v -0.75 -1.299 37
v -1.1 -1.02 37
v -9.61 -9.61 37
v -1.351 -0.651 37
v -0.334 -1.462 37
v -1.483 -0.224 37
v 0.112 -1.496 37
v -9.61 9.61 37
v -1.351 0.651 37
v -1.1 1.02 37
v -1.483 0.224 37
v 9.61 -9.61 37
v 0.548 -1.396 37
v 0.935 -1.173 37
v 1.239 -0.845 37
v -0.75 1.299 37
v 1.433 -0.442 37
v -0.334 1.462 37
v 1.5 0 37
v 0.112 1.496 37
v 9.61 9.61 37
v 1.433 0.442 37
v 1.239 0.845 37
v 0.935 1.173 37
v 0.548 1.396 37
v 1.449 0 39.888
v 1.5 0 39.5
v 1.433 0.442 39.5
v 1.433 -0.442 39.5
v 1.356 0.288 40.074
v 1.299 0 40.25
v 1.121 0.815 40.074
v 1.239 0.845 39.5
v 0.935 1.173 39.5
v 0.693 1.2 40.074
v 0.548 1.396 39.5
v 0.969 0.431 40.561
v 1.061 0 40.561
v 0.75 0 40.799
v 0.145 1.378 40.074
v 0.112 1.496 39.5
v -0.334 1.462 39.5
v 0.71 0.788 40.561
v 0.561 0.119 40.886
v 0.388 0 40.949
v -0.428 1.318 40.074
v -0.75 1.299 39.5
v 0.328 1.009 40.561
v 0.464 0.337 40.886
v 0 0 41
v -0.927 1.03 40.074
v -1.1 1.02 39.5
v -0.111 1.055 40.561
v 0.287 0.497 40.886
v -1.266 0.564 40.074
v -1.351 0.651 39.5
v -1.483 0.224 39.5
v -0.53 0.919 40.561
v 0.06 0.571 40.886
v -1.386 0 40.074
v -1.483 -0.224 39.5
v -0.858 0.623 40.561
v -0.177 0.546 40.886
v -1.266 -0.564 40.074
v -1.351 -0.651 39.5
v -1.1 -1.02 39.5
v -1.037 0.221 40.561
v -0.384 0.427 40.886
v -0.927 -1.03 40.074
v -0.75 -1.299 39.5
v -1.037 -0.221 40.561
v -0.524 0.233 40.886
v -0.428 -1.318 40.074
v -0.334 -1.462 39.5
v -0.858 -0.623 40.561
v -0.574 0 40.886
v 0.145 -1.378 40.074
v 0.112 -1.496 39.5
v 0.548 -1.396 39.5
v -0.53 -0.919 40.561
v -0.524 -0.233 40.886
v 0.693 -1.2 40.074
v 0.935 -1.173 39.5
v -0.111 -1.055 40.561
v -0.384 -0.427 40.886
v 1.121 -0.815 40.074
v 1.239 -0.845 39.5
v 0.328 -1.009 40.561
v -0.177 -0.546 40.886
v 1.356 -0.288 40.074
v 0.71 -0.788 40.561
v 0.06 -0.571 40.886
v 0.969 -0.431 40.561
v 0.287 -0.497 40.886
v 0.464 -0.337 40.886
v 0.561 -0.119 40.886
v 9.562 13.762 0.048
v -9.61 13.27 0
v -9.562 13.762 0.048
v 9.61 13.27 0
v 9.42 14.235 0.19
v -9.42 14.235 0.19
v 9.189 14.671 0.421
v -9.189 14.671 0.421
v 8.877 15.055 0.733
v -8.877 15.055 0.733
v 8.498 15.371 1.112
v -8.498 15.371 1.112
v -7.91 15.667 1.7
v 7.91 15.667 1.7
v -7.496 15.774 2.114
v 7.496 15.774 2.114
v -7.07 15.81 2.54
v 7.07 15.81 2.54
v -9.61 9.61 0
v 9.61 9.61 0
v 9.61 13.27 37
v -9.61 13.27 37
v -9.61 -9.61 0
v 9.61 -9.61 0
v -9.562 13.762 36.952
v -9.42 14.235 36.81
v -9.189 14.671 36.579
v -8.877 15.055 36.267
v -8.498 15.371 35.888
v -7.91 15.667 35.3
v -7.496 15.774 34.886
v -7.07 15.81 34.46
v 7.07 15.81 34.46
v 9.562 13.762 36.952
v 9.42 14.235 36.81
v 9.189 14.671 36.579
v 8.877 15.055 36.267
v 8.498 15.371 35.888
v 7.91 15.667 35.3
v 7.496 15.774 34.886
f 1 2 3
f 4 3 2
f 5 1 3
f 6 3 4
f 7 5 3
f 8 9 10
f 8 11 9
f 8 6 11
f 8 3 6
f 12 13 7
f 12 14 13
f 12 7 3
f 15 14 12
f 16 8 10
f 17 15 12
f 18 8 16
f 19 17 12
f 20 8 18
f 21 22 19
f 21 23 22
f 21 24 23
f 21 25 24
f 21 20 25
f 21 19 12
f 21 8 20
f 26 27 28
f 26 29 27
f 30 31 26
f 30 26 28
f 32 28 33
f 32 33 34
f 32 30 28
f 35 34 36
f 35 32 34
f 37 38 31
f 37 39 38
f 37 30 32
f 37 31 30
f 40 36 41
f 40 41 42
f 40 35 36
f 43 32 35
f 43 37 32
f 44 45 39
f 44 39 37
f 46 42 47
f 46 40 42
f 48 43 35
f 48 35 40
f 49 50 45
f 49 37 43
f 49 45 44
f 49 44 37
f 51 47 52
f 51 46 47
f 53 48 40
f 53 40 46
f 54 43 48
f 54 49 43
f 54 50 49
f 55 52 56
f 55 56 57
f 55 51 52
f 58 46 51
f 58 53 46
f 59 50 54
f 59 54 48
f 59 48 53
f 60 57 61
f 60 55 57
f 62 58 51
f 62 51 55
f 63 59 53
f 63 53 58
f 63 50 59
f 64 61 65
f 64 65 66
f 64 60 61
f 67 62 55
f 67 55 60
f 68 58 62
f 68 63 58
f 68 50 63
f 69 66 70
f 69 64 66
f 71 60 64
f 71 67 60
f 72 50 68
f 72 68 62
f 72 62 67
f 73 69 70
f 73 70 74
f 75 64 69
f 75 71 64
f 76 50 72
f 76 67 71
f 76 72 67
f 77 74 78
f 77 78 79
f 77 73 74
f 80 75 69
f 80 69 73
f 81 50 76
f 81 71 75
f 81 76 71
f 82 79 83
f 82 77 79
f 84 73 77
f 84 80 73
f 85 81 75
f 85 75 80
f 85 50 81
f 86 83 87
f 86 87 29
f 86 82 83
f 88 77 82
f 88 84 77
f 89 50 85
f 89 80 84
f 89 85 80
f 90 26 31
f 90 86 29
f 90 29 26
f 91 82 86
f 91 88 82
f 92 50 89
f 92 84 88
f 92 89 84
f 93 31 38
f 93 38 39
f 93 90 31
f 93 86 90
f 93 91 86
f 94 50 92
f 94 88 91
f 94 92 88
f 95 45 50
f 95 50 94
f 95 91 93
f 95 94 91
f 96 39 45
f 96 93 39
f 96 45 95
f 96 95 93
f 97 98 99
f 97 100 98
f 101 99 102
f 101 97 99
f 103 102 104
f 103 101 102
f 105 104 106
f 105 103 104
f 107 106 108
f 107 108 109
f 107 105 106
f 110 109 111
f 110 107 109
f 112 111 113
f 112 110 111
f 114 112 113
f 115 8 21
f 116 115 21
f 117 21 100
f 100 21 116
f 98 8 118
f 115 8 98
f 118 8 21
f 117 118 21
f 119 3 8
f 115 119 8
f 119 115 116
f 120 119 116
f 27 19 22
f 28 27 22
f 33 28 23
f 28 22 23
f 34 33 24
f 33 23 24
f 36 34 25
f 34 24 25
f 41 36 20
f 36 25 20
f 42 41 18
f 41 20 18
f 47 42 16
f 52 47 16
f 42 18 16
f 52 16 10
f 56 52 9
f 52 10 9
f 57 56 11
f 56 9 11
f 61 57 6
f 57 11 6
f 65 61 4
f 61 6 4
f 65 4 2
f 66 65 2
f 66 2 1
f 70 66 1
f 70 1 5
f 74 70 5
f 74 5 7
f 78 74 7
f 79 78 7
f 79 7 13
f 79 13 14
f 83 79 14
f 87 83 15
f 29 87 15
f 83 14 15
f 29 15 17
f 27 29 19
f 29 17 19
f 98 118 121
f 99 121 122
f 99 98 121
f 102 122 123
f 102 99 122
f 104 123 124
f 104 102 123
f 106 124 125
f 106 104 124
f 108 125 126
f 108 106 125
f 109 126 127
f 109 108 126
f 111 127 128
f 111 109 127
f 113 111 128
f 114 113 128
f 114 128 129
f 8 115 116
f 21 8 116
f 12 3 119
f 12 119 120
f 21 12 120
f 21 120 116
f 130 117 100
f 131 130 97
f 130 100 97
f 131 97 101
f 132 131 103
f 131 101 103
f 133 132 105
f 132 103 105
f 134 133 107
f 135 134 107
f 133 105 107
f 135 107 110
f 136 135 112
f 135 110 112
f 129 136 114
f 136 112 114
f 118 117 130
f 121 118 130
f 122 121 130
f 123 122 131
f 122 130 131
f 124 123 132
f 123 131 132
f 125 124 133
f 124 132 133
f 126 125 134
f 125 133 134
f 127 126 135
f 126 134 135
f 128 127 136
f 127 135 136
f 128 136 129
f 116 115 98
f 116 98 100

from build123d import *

# Parameters (mm, degrees)
SKETCH1_W           = 19.22
SKETCH1_H           = 19.22
BOSS_EXTRUDE1_DEPTH = 37
SKETCH3_R           = 1.5
BOSS_EXTRUDE2_DEPTH = 2.5
DOME1_FACE_RADIUS   = 1.5
DOME1_HEIGHT        = 1.5
SKETCH4_W           = 19.22
SKETCH4_H           = 37
BOSS_EXTRUDE3_DEPTH = 6.2
FILLET1_R           = 2.54


with BuildPart() as part:
    # Sketch1 → Boss-Extrude1 (new body)
    with BuildSketch(Plane.XY):
        Rectangle(SKETCH1_W, SKETCH1_H)
    extrude(amount=BOSS_EXTRUDE1_DEPTH)

    # Sketch3 → Boss-Extrude2 (add)
    with BuildSketch(Plane.XY.offset(37)):
        Circle(SKETCH3_R)
    extrude(amount=BOSS_EXTRUDE2_DEPTH)

    # Dome1: a dome of height H over a round flat face of radius A is a cap of a sphere of radius (A * A + H * H) / (2 * H)
    dome1_r = (DOME1_FACE_RADIUS * DOME1_FACE_RADIUS + DOME1_HEIGHT * DOME1_HEIGHT) / (2 * DOME1_HEIGHT)
    dome1_base = Plane((0, 0, 39.5), z_dir=(0, 0, 1))
    with Locations(dome1_base.offset(DOME1_HEIGHT - dome1_r)):
        dome1_ball = Sphere(dome1_r, mode=Mode.PRIVATE)
    add(split(dome1_ball, bisect_by=dome1_base, keep=Keep.TOP, mode=Mode.PRIVATE))


with BuildPart() as body_2:
    # Sketch4 → Boss-Extrude3 (new body)
    with BuildSketch(Plane(origin=(0, 9.61, 0), x_dir=(1, 0, 0), z_dir=(0, 1, 0))):
        with Locations((0, -18.5)):
            Rectangle(SKETCH4_W, SKETCH4_H)
    extrude(amount=BOSS_EXTRUDE3_DEPTH)

    # Fillet1
    fillet1_edges = [body_2.edges().sort_by_distance(p)[0] for p in [
        (-9.61, 15.81, 18.5),
        (0, 15.81, 37),
        (9.61, 15.81, 18.5),
        (0, 15.81, 0),
    ]]
    fillet(fillet1_edges, radius=FILLET1_R)


solid = Compound([part.part, body_2.part])
